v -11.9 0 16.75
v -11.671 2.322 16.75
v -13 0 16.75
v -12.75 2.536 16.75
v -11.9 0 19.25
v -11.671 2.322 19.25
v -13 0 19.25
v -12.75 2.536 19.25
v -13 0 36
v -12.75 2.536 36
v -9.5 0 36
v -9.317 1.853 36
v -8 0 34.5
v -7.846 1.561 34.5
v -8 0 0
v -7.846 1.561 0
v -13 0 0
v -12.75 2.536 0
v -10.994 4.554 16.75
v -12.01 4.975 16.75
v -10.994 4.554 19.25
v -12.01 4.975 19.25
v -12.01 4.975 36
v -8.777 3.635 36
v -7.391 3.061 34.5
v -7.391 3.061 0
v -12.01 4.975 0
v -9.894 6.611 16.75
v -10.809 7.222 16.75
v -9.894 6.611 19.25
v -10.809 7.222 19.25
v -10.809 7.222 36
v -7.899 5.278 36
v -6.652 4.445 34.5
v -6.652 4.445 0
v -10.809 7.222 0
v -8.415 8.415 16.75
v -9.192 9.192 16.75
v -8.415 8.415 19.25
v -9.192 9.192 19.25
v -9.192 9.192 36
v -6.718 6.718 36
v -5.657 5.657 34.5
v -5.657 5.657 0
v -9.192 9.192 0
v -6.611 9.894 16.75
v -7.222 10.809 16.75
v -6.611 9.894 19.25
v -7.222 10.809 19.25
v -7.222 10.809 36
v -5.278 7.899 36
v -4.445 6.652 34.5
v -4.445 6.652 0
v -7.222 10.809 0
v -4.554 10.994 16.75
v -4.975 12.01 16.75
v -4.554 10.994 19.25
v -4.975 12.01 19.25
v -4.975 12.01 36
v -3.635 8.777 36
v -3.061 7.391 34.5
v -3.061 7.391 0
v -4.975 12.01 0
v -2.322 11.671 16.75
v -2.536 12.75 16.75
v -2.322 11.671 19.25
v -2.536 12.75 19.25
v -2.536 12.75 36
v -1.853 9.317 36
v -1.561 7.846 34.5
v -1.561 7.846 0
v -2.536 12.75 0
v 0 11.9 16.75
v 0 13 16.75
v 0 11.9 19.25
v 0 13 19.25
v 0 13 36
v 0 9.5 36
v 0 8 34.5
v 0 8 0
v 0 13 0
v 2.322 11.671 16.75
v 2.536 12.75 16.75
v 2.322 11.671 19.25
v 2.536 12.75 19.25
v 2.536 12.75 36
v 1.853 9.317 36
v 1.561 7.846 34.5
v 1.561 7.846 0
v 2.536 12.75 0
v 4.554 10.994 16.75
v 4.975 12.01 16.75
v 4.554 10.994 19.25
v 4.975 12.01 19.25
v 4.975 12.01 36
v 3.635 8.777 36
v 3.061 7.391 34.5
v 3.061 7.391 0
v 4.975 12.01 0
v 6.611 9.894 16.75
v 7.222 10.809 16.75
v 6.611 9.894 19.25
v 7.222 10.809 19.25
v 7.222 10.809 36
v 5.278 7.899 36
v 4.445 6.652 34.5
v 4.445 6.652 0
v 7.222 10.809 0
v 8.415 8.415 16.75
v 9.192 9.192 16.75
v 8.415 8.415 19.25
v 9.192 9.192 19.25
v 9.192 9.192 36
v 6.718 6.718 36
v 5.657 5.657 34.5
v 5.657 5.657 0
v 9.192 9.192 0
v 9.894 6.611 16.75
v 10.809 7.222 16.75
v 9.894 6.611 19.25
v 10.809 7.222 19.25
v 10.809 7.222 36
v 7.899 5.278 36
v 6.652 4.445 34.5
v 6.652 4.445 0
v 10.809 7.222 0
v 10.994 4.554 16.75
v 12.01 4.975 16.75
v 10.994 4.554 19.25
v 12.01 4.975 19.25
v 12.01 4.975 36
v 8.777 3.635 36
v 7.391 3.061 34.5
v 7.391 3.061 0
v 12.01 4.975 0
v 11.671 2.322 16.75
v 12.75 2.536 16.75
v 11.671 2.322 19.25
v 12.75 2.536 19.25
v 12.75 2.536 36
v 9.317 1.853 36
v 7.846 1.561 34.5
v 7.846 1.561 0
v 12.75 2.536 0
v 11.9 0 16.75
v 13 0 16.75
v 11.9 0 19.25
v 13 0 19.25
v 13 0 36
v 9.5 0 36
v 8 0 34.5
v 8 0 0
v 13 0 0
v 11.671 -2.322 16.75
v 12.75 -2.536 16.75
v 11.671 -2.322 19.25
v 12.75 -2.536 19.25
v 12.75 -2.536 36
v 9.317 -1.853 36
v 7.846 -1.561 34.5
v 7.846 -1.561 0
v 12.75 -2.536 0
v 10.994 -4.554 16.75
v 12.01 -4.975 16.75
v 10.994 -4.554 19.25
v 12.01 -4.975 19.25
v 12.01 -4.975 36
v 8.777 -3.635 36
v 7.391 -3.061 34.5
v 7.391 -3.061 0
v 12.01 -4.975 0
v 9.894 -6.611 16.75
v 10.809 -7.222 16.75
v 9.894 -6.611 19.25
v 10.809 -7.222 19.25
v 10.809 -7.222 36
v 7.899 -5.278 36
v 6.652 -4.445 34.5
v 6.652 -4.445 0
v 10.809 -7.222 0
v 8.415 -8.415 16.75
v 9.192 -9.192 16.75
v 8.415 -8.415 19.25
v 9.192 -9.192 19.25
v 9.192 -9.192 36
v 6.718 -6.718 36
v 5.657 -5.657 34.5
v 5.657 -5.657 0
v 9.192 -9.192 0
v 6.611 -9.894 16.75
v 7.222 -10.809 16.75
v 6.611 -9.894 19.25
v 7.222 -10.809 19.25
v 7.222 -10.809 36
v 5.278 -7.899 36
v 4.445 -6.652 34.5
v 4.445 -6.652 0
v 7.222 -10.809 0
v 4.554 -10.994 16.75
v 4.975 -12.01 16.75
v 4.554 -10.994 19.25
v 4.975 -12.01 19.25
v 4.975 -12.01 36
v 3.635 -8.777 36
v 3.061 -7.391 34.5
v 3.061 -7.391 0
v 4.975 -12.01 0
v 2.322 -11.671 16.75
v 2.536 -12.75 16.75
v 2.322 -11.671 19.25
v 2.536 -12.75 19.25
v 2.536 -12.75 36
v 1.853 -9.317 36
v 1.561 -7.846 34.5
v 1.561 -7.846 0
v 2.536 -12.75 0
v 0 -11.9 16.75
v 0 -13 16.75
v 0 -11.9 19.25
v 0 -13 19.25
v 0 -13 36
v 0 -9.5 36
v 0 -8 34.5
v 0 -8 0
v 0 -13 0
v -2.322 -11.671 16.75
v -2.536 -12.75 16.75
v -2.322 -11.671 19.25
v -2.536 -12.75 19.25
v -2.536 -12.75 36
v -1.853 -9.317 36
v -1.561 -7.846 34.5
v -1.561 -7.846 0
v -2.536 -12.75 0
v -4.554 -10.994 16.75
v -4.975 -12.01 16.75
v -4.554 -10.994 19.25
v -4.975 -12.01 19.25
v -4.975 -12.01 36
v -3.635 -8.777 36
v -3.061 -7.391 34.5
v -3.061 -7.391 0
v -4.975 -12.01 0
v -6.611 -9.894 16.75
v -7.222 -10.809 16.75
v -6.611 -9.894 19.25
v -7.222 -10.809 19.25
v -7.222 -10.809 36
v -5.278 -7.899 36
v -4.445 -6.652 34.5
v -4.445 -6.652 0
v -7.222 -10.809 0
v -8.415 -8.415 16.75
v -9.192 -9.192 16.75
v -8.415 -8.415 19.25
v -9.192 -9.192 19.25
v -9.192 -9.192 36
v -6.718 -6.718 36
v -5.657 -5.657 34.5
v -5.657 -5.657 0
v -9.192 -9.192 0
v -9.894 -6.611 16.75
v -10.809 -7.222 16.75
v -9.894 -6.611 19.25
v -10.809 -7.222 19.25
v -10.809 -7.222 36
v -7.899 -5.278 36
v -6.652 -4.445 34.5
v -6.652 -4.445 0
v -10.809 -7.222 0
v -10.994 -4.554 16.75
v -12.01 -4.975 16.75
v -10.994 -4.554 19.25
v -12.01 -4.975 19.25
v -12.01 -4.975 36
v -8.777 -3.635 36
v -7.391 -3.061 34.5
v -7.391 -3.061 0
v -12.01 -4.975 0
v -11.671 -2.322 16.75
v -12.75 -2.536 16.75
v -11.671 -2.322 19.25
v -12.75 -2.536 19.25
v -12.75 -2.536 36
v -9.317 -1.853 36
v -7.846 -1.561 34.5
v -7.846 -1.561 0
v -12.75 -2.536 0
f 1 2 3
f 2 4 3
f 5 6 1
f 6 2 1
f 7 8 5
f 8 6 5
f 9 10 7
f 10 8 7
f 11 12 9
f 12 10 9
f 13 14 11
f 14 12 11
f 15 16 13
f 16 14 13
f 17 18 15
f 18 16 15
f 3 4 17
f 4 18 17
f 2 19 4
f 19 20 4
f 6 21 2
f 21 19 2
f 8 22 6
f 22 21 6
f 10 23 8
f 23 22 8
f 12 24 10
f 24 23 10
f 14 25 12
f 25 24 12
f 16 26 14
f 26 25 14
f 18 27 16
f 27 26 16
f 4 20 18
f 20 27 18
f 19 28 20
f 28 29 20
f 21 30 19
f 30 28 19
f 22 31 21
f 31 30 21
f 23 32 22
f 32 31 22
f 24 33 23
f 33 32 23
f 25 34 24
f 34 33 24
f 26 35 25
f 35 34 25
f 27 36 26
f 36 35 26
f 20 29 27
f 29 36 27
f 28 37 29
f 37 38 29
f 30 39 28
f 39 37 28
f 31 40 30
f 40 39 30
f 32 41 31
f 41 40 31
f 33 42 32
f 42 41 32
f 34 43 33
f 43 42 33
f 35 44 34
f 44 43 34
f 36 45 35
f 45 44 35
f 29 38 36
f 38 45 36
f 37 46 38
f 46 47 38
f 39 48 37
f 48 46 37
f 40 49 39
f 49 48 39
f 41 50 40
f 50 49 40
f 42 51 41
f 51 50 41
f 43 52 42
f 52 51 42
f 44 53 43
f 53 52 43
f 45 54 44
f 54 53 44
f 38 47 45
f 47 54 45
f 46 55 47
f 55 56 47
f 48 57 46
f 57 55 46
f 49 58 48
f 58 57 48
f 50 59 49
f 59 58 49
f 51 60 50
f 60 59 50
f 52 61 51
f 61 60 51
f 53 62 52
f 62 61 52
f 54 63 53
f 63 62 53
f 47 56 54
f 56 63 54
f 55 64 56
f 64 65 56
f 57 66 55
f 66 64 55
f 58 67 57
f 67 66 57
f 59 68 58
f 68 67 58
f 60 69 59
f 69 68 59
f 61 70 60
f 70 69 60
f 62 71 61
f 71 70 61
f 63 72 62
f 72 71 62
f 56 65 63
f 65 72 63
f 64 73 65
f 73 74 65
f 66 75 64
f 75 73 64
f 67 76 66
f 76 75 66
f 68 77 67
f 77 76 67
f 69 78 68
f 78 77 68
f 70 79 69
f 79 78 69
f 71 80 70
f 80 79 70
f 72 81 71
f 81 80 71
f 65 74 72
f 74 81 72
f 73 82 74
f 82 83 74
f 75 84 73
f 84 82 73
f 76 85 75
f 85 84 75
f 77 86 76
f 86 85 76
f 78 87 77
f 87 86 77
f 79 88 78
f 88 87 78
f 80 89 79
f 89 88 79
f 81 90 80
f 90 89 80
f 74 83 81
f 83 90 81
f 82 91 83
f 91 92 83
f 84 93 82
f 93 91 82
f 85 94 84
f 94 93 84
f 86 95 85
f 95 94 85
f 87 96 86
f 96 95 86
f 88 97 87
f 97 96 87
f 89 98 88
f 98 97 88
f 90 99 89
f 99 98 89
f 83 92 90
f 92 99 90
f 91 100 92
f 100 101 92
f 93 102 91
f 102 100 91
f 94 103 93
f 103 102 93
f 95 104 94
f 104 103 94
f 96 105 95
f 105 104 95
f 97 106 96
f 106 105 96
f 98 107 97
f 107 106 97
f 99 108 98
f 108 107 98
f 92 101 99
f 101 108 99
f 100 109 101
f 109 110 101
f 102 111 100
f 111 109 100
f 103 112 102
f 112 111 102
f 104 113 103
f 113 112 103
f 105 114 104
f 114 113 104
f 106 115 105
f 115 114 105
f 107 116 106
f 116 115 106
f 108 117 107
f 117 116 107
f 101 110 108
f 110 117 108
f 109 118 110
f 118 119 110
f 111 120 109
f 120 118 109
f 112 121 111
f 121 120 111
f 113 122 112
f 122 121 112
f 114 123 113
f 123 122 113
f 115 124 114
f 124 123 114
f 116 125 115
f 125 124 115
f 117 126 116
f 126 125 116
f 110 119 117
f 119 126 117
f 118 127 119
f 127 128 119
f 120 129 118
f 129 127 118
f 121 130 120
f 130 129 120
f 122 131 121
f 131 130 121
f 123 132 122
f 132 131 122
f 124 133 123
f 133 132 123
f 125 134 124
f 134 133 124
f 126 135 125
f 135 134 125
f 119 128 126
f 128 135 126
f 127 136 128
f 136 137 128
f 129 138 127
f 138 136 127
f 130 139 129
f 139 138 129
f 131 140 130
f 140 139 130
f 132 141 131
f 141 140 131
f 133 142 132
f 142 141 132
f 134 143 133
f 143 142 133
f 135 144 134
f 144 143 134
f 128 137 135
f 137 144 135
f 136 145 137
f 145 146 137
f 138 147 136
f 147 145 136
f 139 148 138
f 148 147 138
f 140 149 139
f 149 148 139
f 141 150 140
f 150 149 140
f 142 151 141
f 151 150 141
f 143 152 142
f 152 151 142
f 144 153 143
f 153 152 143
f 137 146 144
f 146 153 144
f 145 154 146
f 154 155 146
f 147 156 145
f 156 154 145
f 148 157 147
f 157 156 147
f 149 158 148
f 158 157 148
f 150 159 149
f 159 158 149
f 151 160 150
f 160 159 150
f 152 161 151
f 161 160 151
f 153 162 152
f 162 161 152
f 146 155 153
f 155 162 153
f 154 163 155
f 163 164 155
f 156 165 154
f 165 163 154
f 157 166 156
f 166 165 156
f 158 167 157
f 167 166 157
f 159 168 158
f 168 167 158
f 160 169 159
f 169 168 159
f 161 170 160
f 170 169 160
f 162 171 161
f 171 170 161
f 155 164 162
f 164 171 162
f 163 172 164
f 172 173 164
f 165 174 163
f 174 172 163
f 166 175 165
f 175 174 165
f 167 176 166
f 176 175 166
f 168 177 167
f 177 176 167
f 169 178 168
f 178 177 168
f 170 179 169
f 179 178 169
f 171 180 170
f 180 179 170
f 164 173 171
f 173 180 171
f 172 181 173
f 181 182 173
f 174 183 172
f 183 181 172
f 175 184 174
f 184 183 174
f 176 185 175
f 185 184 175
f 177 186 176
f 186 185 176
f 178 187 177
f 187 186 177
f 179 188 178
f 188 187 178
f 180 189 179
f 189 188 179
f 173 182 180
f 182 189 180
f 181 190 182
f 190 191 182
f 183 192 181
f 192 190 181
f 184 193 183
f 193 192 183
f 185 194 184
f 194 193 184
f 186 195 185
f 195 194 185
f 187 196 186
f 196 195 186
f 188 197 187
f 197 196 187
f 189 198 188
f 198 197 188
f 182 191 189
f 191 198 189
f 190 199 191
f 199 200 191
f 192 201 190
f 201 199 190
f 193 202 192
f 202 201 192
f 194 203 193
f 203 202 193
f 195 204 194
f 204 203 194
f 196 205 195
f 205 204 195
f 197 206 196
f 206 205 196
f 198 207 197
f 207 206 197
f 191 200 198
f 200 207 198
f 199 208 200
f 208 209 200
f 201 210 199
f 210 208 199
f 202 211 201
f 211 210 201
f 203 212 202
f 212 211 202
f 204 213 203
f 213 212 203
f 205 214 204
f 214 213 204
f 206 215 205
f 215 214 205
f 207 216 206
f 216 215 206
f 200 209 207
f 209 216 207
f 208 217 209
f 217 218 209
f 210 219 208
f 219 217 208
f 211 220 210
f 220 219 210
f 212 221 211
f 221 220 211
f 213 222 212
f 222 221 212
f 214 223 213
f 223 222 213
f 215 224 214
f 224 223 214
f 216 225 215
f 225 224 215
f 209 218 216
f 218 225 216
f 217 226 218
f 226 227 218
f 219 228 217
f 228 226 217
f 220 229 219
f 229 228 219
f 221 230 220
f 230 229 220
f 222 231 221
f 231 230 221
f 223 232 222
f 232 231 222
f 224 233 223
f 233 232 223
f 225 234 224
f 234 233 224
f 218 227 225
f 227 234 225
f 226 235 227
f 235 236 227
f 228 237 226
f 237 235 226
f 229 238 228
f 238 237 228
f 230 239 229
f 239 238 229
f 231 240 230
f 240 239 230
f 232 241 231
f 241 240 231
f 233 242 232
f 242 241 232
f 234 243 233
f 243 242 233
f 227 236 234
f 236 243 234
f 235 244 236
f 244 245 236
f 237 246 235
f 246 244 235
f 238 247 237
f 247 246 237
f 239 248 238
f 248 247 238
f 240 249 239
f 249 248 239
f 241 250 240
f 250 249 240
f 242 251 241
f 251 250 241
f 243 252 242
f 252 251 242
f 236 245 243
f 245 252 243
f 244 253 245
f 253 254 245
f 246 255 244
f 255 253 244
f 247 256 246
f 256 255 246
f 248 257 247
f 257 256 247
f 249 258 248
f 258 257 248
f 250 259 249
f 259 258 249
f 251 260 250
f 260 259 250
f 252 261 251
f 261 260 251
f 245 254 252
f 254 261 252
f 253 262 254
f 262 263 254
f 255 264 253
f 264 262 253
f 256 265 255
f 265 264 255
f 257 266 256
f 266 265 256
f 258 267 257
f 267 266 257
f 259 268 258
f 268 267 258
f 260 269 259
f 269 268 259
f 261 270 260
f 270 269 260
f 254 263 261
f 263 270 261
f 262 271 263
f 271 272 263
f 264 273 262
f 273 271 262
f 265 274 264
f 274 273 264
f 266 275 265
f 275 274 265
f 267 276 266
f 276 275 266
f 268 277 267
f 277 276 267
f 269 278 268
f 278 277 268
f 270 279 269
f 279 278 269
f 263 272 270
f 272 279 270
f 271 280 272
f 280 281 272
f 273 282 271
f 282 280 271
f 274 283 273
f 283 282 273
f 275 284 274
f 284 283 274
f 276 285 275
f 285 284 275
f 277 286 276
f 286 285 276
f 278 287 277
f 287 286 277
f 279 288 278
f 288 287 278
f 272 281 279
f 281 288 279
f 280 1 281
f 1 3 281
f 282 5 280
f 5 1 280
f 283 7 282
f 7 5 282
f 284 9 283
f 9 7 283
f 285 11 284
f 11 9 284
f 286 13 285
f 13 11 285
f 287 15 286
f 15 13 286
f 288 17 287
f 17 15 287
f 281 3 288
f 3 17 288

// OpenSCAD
$fn = 32;

// ----------------------------------------------------------------------
// Grooved revolve: thread_relief, bore R8
// ----------------------------------------------------------------------

// --- parameters (mm) ---
bore_r = 8;               // bore radius
outer_r = 13;             // outer radius of the body
total_h = 36;             // overall height, Z
wall = 5;                 // radial wall thickness
groove_w = 2.5;           // groove width
groove_d = 1.1;           // groove depth
grooves = 1;              // number of outer grooves
relief = 1.5;             // thread relief leg at the bore mouth
relief_angle = 45;        // thread relief chamfer angle, degrees
fit_tol = 0.05;           // declared fit tolerance (prompt contract)
free_tol = 0.3;           // declared free tolerance (prompt contract)

bbox_x = 2 * outer_r;  // full diameter
bore_d = 2 * bore_r;  // bore diameter
body_d = 2 * outer_r;  // body diameter
revolve_angle = 360;  // full turn around the Z axis

profile = [[8, 0], [13, 0], [13, 16.75], [11.9, 16.75], [11.9, 19.25], [13, 19.25], [13, 36], [9.5, 36], [8, 34.5]];  // primary outline, 9 points, counter clockwise

// --- the one profile operation ---
rotate_extrude(angle = revolve_angle) polygon(points = profile);
